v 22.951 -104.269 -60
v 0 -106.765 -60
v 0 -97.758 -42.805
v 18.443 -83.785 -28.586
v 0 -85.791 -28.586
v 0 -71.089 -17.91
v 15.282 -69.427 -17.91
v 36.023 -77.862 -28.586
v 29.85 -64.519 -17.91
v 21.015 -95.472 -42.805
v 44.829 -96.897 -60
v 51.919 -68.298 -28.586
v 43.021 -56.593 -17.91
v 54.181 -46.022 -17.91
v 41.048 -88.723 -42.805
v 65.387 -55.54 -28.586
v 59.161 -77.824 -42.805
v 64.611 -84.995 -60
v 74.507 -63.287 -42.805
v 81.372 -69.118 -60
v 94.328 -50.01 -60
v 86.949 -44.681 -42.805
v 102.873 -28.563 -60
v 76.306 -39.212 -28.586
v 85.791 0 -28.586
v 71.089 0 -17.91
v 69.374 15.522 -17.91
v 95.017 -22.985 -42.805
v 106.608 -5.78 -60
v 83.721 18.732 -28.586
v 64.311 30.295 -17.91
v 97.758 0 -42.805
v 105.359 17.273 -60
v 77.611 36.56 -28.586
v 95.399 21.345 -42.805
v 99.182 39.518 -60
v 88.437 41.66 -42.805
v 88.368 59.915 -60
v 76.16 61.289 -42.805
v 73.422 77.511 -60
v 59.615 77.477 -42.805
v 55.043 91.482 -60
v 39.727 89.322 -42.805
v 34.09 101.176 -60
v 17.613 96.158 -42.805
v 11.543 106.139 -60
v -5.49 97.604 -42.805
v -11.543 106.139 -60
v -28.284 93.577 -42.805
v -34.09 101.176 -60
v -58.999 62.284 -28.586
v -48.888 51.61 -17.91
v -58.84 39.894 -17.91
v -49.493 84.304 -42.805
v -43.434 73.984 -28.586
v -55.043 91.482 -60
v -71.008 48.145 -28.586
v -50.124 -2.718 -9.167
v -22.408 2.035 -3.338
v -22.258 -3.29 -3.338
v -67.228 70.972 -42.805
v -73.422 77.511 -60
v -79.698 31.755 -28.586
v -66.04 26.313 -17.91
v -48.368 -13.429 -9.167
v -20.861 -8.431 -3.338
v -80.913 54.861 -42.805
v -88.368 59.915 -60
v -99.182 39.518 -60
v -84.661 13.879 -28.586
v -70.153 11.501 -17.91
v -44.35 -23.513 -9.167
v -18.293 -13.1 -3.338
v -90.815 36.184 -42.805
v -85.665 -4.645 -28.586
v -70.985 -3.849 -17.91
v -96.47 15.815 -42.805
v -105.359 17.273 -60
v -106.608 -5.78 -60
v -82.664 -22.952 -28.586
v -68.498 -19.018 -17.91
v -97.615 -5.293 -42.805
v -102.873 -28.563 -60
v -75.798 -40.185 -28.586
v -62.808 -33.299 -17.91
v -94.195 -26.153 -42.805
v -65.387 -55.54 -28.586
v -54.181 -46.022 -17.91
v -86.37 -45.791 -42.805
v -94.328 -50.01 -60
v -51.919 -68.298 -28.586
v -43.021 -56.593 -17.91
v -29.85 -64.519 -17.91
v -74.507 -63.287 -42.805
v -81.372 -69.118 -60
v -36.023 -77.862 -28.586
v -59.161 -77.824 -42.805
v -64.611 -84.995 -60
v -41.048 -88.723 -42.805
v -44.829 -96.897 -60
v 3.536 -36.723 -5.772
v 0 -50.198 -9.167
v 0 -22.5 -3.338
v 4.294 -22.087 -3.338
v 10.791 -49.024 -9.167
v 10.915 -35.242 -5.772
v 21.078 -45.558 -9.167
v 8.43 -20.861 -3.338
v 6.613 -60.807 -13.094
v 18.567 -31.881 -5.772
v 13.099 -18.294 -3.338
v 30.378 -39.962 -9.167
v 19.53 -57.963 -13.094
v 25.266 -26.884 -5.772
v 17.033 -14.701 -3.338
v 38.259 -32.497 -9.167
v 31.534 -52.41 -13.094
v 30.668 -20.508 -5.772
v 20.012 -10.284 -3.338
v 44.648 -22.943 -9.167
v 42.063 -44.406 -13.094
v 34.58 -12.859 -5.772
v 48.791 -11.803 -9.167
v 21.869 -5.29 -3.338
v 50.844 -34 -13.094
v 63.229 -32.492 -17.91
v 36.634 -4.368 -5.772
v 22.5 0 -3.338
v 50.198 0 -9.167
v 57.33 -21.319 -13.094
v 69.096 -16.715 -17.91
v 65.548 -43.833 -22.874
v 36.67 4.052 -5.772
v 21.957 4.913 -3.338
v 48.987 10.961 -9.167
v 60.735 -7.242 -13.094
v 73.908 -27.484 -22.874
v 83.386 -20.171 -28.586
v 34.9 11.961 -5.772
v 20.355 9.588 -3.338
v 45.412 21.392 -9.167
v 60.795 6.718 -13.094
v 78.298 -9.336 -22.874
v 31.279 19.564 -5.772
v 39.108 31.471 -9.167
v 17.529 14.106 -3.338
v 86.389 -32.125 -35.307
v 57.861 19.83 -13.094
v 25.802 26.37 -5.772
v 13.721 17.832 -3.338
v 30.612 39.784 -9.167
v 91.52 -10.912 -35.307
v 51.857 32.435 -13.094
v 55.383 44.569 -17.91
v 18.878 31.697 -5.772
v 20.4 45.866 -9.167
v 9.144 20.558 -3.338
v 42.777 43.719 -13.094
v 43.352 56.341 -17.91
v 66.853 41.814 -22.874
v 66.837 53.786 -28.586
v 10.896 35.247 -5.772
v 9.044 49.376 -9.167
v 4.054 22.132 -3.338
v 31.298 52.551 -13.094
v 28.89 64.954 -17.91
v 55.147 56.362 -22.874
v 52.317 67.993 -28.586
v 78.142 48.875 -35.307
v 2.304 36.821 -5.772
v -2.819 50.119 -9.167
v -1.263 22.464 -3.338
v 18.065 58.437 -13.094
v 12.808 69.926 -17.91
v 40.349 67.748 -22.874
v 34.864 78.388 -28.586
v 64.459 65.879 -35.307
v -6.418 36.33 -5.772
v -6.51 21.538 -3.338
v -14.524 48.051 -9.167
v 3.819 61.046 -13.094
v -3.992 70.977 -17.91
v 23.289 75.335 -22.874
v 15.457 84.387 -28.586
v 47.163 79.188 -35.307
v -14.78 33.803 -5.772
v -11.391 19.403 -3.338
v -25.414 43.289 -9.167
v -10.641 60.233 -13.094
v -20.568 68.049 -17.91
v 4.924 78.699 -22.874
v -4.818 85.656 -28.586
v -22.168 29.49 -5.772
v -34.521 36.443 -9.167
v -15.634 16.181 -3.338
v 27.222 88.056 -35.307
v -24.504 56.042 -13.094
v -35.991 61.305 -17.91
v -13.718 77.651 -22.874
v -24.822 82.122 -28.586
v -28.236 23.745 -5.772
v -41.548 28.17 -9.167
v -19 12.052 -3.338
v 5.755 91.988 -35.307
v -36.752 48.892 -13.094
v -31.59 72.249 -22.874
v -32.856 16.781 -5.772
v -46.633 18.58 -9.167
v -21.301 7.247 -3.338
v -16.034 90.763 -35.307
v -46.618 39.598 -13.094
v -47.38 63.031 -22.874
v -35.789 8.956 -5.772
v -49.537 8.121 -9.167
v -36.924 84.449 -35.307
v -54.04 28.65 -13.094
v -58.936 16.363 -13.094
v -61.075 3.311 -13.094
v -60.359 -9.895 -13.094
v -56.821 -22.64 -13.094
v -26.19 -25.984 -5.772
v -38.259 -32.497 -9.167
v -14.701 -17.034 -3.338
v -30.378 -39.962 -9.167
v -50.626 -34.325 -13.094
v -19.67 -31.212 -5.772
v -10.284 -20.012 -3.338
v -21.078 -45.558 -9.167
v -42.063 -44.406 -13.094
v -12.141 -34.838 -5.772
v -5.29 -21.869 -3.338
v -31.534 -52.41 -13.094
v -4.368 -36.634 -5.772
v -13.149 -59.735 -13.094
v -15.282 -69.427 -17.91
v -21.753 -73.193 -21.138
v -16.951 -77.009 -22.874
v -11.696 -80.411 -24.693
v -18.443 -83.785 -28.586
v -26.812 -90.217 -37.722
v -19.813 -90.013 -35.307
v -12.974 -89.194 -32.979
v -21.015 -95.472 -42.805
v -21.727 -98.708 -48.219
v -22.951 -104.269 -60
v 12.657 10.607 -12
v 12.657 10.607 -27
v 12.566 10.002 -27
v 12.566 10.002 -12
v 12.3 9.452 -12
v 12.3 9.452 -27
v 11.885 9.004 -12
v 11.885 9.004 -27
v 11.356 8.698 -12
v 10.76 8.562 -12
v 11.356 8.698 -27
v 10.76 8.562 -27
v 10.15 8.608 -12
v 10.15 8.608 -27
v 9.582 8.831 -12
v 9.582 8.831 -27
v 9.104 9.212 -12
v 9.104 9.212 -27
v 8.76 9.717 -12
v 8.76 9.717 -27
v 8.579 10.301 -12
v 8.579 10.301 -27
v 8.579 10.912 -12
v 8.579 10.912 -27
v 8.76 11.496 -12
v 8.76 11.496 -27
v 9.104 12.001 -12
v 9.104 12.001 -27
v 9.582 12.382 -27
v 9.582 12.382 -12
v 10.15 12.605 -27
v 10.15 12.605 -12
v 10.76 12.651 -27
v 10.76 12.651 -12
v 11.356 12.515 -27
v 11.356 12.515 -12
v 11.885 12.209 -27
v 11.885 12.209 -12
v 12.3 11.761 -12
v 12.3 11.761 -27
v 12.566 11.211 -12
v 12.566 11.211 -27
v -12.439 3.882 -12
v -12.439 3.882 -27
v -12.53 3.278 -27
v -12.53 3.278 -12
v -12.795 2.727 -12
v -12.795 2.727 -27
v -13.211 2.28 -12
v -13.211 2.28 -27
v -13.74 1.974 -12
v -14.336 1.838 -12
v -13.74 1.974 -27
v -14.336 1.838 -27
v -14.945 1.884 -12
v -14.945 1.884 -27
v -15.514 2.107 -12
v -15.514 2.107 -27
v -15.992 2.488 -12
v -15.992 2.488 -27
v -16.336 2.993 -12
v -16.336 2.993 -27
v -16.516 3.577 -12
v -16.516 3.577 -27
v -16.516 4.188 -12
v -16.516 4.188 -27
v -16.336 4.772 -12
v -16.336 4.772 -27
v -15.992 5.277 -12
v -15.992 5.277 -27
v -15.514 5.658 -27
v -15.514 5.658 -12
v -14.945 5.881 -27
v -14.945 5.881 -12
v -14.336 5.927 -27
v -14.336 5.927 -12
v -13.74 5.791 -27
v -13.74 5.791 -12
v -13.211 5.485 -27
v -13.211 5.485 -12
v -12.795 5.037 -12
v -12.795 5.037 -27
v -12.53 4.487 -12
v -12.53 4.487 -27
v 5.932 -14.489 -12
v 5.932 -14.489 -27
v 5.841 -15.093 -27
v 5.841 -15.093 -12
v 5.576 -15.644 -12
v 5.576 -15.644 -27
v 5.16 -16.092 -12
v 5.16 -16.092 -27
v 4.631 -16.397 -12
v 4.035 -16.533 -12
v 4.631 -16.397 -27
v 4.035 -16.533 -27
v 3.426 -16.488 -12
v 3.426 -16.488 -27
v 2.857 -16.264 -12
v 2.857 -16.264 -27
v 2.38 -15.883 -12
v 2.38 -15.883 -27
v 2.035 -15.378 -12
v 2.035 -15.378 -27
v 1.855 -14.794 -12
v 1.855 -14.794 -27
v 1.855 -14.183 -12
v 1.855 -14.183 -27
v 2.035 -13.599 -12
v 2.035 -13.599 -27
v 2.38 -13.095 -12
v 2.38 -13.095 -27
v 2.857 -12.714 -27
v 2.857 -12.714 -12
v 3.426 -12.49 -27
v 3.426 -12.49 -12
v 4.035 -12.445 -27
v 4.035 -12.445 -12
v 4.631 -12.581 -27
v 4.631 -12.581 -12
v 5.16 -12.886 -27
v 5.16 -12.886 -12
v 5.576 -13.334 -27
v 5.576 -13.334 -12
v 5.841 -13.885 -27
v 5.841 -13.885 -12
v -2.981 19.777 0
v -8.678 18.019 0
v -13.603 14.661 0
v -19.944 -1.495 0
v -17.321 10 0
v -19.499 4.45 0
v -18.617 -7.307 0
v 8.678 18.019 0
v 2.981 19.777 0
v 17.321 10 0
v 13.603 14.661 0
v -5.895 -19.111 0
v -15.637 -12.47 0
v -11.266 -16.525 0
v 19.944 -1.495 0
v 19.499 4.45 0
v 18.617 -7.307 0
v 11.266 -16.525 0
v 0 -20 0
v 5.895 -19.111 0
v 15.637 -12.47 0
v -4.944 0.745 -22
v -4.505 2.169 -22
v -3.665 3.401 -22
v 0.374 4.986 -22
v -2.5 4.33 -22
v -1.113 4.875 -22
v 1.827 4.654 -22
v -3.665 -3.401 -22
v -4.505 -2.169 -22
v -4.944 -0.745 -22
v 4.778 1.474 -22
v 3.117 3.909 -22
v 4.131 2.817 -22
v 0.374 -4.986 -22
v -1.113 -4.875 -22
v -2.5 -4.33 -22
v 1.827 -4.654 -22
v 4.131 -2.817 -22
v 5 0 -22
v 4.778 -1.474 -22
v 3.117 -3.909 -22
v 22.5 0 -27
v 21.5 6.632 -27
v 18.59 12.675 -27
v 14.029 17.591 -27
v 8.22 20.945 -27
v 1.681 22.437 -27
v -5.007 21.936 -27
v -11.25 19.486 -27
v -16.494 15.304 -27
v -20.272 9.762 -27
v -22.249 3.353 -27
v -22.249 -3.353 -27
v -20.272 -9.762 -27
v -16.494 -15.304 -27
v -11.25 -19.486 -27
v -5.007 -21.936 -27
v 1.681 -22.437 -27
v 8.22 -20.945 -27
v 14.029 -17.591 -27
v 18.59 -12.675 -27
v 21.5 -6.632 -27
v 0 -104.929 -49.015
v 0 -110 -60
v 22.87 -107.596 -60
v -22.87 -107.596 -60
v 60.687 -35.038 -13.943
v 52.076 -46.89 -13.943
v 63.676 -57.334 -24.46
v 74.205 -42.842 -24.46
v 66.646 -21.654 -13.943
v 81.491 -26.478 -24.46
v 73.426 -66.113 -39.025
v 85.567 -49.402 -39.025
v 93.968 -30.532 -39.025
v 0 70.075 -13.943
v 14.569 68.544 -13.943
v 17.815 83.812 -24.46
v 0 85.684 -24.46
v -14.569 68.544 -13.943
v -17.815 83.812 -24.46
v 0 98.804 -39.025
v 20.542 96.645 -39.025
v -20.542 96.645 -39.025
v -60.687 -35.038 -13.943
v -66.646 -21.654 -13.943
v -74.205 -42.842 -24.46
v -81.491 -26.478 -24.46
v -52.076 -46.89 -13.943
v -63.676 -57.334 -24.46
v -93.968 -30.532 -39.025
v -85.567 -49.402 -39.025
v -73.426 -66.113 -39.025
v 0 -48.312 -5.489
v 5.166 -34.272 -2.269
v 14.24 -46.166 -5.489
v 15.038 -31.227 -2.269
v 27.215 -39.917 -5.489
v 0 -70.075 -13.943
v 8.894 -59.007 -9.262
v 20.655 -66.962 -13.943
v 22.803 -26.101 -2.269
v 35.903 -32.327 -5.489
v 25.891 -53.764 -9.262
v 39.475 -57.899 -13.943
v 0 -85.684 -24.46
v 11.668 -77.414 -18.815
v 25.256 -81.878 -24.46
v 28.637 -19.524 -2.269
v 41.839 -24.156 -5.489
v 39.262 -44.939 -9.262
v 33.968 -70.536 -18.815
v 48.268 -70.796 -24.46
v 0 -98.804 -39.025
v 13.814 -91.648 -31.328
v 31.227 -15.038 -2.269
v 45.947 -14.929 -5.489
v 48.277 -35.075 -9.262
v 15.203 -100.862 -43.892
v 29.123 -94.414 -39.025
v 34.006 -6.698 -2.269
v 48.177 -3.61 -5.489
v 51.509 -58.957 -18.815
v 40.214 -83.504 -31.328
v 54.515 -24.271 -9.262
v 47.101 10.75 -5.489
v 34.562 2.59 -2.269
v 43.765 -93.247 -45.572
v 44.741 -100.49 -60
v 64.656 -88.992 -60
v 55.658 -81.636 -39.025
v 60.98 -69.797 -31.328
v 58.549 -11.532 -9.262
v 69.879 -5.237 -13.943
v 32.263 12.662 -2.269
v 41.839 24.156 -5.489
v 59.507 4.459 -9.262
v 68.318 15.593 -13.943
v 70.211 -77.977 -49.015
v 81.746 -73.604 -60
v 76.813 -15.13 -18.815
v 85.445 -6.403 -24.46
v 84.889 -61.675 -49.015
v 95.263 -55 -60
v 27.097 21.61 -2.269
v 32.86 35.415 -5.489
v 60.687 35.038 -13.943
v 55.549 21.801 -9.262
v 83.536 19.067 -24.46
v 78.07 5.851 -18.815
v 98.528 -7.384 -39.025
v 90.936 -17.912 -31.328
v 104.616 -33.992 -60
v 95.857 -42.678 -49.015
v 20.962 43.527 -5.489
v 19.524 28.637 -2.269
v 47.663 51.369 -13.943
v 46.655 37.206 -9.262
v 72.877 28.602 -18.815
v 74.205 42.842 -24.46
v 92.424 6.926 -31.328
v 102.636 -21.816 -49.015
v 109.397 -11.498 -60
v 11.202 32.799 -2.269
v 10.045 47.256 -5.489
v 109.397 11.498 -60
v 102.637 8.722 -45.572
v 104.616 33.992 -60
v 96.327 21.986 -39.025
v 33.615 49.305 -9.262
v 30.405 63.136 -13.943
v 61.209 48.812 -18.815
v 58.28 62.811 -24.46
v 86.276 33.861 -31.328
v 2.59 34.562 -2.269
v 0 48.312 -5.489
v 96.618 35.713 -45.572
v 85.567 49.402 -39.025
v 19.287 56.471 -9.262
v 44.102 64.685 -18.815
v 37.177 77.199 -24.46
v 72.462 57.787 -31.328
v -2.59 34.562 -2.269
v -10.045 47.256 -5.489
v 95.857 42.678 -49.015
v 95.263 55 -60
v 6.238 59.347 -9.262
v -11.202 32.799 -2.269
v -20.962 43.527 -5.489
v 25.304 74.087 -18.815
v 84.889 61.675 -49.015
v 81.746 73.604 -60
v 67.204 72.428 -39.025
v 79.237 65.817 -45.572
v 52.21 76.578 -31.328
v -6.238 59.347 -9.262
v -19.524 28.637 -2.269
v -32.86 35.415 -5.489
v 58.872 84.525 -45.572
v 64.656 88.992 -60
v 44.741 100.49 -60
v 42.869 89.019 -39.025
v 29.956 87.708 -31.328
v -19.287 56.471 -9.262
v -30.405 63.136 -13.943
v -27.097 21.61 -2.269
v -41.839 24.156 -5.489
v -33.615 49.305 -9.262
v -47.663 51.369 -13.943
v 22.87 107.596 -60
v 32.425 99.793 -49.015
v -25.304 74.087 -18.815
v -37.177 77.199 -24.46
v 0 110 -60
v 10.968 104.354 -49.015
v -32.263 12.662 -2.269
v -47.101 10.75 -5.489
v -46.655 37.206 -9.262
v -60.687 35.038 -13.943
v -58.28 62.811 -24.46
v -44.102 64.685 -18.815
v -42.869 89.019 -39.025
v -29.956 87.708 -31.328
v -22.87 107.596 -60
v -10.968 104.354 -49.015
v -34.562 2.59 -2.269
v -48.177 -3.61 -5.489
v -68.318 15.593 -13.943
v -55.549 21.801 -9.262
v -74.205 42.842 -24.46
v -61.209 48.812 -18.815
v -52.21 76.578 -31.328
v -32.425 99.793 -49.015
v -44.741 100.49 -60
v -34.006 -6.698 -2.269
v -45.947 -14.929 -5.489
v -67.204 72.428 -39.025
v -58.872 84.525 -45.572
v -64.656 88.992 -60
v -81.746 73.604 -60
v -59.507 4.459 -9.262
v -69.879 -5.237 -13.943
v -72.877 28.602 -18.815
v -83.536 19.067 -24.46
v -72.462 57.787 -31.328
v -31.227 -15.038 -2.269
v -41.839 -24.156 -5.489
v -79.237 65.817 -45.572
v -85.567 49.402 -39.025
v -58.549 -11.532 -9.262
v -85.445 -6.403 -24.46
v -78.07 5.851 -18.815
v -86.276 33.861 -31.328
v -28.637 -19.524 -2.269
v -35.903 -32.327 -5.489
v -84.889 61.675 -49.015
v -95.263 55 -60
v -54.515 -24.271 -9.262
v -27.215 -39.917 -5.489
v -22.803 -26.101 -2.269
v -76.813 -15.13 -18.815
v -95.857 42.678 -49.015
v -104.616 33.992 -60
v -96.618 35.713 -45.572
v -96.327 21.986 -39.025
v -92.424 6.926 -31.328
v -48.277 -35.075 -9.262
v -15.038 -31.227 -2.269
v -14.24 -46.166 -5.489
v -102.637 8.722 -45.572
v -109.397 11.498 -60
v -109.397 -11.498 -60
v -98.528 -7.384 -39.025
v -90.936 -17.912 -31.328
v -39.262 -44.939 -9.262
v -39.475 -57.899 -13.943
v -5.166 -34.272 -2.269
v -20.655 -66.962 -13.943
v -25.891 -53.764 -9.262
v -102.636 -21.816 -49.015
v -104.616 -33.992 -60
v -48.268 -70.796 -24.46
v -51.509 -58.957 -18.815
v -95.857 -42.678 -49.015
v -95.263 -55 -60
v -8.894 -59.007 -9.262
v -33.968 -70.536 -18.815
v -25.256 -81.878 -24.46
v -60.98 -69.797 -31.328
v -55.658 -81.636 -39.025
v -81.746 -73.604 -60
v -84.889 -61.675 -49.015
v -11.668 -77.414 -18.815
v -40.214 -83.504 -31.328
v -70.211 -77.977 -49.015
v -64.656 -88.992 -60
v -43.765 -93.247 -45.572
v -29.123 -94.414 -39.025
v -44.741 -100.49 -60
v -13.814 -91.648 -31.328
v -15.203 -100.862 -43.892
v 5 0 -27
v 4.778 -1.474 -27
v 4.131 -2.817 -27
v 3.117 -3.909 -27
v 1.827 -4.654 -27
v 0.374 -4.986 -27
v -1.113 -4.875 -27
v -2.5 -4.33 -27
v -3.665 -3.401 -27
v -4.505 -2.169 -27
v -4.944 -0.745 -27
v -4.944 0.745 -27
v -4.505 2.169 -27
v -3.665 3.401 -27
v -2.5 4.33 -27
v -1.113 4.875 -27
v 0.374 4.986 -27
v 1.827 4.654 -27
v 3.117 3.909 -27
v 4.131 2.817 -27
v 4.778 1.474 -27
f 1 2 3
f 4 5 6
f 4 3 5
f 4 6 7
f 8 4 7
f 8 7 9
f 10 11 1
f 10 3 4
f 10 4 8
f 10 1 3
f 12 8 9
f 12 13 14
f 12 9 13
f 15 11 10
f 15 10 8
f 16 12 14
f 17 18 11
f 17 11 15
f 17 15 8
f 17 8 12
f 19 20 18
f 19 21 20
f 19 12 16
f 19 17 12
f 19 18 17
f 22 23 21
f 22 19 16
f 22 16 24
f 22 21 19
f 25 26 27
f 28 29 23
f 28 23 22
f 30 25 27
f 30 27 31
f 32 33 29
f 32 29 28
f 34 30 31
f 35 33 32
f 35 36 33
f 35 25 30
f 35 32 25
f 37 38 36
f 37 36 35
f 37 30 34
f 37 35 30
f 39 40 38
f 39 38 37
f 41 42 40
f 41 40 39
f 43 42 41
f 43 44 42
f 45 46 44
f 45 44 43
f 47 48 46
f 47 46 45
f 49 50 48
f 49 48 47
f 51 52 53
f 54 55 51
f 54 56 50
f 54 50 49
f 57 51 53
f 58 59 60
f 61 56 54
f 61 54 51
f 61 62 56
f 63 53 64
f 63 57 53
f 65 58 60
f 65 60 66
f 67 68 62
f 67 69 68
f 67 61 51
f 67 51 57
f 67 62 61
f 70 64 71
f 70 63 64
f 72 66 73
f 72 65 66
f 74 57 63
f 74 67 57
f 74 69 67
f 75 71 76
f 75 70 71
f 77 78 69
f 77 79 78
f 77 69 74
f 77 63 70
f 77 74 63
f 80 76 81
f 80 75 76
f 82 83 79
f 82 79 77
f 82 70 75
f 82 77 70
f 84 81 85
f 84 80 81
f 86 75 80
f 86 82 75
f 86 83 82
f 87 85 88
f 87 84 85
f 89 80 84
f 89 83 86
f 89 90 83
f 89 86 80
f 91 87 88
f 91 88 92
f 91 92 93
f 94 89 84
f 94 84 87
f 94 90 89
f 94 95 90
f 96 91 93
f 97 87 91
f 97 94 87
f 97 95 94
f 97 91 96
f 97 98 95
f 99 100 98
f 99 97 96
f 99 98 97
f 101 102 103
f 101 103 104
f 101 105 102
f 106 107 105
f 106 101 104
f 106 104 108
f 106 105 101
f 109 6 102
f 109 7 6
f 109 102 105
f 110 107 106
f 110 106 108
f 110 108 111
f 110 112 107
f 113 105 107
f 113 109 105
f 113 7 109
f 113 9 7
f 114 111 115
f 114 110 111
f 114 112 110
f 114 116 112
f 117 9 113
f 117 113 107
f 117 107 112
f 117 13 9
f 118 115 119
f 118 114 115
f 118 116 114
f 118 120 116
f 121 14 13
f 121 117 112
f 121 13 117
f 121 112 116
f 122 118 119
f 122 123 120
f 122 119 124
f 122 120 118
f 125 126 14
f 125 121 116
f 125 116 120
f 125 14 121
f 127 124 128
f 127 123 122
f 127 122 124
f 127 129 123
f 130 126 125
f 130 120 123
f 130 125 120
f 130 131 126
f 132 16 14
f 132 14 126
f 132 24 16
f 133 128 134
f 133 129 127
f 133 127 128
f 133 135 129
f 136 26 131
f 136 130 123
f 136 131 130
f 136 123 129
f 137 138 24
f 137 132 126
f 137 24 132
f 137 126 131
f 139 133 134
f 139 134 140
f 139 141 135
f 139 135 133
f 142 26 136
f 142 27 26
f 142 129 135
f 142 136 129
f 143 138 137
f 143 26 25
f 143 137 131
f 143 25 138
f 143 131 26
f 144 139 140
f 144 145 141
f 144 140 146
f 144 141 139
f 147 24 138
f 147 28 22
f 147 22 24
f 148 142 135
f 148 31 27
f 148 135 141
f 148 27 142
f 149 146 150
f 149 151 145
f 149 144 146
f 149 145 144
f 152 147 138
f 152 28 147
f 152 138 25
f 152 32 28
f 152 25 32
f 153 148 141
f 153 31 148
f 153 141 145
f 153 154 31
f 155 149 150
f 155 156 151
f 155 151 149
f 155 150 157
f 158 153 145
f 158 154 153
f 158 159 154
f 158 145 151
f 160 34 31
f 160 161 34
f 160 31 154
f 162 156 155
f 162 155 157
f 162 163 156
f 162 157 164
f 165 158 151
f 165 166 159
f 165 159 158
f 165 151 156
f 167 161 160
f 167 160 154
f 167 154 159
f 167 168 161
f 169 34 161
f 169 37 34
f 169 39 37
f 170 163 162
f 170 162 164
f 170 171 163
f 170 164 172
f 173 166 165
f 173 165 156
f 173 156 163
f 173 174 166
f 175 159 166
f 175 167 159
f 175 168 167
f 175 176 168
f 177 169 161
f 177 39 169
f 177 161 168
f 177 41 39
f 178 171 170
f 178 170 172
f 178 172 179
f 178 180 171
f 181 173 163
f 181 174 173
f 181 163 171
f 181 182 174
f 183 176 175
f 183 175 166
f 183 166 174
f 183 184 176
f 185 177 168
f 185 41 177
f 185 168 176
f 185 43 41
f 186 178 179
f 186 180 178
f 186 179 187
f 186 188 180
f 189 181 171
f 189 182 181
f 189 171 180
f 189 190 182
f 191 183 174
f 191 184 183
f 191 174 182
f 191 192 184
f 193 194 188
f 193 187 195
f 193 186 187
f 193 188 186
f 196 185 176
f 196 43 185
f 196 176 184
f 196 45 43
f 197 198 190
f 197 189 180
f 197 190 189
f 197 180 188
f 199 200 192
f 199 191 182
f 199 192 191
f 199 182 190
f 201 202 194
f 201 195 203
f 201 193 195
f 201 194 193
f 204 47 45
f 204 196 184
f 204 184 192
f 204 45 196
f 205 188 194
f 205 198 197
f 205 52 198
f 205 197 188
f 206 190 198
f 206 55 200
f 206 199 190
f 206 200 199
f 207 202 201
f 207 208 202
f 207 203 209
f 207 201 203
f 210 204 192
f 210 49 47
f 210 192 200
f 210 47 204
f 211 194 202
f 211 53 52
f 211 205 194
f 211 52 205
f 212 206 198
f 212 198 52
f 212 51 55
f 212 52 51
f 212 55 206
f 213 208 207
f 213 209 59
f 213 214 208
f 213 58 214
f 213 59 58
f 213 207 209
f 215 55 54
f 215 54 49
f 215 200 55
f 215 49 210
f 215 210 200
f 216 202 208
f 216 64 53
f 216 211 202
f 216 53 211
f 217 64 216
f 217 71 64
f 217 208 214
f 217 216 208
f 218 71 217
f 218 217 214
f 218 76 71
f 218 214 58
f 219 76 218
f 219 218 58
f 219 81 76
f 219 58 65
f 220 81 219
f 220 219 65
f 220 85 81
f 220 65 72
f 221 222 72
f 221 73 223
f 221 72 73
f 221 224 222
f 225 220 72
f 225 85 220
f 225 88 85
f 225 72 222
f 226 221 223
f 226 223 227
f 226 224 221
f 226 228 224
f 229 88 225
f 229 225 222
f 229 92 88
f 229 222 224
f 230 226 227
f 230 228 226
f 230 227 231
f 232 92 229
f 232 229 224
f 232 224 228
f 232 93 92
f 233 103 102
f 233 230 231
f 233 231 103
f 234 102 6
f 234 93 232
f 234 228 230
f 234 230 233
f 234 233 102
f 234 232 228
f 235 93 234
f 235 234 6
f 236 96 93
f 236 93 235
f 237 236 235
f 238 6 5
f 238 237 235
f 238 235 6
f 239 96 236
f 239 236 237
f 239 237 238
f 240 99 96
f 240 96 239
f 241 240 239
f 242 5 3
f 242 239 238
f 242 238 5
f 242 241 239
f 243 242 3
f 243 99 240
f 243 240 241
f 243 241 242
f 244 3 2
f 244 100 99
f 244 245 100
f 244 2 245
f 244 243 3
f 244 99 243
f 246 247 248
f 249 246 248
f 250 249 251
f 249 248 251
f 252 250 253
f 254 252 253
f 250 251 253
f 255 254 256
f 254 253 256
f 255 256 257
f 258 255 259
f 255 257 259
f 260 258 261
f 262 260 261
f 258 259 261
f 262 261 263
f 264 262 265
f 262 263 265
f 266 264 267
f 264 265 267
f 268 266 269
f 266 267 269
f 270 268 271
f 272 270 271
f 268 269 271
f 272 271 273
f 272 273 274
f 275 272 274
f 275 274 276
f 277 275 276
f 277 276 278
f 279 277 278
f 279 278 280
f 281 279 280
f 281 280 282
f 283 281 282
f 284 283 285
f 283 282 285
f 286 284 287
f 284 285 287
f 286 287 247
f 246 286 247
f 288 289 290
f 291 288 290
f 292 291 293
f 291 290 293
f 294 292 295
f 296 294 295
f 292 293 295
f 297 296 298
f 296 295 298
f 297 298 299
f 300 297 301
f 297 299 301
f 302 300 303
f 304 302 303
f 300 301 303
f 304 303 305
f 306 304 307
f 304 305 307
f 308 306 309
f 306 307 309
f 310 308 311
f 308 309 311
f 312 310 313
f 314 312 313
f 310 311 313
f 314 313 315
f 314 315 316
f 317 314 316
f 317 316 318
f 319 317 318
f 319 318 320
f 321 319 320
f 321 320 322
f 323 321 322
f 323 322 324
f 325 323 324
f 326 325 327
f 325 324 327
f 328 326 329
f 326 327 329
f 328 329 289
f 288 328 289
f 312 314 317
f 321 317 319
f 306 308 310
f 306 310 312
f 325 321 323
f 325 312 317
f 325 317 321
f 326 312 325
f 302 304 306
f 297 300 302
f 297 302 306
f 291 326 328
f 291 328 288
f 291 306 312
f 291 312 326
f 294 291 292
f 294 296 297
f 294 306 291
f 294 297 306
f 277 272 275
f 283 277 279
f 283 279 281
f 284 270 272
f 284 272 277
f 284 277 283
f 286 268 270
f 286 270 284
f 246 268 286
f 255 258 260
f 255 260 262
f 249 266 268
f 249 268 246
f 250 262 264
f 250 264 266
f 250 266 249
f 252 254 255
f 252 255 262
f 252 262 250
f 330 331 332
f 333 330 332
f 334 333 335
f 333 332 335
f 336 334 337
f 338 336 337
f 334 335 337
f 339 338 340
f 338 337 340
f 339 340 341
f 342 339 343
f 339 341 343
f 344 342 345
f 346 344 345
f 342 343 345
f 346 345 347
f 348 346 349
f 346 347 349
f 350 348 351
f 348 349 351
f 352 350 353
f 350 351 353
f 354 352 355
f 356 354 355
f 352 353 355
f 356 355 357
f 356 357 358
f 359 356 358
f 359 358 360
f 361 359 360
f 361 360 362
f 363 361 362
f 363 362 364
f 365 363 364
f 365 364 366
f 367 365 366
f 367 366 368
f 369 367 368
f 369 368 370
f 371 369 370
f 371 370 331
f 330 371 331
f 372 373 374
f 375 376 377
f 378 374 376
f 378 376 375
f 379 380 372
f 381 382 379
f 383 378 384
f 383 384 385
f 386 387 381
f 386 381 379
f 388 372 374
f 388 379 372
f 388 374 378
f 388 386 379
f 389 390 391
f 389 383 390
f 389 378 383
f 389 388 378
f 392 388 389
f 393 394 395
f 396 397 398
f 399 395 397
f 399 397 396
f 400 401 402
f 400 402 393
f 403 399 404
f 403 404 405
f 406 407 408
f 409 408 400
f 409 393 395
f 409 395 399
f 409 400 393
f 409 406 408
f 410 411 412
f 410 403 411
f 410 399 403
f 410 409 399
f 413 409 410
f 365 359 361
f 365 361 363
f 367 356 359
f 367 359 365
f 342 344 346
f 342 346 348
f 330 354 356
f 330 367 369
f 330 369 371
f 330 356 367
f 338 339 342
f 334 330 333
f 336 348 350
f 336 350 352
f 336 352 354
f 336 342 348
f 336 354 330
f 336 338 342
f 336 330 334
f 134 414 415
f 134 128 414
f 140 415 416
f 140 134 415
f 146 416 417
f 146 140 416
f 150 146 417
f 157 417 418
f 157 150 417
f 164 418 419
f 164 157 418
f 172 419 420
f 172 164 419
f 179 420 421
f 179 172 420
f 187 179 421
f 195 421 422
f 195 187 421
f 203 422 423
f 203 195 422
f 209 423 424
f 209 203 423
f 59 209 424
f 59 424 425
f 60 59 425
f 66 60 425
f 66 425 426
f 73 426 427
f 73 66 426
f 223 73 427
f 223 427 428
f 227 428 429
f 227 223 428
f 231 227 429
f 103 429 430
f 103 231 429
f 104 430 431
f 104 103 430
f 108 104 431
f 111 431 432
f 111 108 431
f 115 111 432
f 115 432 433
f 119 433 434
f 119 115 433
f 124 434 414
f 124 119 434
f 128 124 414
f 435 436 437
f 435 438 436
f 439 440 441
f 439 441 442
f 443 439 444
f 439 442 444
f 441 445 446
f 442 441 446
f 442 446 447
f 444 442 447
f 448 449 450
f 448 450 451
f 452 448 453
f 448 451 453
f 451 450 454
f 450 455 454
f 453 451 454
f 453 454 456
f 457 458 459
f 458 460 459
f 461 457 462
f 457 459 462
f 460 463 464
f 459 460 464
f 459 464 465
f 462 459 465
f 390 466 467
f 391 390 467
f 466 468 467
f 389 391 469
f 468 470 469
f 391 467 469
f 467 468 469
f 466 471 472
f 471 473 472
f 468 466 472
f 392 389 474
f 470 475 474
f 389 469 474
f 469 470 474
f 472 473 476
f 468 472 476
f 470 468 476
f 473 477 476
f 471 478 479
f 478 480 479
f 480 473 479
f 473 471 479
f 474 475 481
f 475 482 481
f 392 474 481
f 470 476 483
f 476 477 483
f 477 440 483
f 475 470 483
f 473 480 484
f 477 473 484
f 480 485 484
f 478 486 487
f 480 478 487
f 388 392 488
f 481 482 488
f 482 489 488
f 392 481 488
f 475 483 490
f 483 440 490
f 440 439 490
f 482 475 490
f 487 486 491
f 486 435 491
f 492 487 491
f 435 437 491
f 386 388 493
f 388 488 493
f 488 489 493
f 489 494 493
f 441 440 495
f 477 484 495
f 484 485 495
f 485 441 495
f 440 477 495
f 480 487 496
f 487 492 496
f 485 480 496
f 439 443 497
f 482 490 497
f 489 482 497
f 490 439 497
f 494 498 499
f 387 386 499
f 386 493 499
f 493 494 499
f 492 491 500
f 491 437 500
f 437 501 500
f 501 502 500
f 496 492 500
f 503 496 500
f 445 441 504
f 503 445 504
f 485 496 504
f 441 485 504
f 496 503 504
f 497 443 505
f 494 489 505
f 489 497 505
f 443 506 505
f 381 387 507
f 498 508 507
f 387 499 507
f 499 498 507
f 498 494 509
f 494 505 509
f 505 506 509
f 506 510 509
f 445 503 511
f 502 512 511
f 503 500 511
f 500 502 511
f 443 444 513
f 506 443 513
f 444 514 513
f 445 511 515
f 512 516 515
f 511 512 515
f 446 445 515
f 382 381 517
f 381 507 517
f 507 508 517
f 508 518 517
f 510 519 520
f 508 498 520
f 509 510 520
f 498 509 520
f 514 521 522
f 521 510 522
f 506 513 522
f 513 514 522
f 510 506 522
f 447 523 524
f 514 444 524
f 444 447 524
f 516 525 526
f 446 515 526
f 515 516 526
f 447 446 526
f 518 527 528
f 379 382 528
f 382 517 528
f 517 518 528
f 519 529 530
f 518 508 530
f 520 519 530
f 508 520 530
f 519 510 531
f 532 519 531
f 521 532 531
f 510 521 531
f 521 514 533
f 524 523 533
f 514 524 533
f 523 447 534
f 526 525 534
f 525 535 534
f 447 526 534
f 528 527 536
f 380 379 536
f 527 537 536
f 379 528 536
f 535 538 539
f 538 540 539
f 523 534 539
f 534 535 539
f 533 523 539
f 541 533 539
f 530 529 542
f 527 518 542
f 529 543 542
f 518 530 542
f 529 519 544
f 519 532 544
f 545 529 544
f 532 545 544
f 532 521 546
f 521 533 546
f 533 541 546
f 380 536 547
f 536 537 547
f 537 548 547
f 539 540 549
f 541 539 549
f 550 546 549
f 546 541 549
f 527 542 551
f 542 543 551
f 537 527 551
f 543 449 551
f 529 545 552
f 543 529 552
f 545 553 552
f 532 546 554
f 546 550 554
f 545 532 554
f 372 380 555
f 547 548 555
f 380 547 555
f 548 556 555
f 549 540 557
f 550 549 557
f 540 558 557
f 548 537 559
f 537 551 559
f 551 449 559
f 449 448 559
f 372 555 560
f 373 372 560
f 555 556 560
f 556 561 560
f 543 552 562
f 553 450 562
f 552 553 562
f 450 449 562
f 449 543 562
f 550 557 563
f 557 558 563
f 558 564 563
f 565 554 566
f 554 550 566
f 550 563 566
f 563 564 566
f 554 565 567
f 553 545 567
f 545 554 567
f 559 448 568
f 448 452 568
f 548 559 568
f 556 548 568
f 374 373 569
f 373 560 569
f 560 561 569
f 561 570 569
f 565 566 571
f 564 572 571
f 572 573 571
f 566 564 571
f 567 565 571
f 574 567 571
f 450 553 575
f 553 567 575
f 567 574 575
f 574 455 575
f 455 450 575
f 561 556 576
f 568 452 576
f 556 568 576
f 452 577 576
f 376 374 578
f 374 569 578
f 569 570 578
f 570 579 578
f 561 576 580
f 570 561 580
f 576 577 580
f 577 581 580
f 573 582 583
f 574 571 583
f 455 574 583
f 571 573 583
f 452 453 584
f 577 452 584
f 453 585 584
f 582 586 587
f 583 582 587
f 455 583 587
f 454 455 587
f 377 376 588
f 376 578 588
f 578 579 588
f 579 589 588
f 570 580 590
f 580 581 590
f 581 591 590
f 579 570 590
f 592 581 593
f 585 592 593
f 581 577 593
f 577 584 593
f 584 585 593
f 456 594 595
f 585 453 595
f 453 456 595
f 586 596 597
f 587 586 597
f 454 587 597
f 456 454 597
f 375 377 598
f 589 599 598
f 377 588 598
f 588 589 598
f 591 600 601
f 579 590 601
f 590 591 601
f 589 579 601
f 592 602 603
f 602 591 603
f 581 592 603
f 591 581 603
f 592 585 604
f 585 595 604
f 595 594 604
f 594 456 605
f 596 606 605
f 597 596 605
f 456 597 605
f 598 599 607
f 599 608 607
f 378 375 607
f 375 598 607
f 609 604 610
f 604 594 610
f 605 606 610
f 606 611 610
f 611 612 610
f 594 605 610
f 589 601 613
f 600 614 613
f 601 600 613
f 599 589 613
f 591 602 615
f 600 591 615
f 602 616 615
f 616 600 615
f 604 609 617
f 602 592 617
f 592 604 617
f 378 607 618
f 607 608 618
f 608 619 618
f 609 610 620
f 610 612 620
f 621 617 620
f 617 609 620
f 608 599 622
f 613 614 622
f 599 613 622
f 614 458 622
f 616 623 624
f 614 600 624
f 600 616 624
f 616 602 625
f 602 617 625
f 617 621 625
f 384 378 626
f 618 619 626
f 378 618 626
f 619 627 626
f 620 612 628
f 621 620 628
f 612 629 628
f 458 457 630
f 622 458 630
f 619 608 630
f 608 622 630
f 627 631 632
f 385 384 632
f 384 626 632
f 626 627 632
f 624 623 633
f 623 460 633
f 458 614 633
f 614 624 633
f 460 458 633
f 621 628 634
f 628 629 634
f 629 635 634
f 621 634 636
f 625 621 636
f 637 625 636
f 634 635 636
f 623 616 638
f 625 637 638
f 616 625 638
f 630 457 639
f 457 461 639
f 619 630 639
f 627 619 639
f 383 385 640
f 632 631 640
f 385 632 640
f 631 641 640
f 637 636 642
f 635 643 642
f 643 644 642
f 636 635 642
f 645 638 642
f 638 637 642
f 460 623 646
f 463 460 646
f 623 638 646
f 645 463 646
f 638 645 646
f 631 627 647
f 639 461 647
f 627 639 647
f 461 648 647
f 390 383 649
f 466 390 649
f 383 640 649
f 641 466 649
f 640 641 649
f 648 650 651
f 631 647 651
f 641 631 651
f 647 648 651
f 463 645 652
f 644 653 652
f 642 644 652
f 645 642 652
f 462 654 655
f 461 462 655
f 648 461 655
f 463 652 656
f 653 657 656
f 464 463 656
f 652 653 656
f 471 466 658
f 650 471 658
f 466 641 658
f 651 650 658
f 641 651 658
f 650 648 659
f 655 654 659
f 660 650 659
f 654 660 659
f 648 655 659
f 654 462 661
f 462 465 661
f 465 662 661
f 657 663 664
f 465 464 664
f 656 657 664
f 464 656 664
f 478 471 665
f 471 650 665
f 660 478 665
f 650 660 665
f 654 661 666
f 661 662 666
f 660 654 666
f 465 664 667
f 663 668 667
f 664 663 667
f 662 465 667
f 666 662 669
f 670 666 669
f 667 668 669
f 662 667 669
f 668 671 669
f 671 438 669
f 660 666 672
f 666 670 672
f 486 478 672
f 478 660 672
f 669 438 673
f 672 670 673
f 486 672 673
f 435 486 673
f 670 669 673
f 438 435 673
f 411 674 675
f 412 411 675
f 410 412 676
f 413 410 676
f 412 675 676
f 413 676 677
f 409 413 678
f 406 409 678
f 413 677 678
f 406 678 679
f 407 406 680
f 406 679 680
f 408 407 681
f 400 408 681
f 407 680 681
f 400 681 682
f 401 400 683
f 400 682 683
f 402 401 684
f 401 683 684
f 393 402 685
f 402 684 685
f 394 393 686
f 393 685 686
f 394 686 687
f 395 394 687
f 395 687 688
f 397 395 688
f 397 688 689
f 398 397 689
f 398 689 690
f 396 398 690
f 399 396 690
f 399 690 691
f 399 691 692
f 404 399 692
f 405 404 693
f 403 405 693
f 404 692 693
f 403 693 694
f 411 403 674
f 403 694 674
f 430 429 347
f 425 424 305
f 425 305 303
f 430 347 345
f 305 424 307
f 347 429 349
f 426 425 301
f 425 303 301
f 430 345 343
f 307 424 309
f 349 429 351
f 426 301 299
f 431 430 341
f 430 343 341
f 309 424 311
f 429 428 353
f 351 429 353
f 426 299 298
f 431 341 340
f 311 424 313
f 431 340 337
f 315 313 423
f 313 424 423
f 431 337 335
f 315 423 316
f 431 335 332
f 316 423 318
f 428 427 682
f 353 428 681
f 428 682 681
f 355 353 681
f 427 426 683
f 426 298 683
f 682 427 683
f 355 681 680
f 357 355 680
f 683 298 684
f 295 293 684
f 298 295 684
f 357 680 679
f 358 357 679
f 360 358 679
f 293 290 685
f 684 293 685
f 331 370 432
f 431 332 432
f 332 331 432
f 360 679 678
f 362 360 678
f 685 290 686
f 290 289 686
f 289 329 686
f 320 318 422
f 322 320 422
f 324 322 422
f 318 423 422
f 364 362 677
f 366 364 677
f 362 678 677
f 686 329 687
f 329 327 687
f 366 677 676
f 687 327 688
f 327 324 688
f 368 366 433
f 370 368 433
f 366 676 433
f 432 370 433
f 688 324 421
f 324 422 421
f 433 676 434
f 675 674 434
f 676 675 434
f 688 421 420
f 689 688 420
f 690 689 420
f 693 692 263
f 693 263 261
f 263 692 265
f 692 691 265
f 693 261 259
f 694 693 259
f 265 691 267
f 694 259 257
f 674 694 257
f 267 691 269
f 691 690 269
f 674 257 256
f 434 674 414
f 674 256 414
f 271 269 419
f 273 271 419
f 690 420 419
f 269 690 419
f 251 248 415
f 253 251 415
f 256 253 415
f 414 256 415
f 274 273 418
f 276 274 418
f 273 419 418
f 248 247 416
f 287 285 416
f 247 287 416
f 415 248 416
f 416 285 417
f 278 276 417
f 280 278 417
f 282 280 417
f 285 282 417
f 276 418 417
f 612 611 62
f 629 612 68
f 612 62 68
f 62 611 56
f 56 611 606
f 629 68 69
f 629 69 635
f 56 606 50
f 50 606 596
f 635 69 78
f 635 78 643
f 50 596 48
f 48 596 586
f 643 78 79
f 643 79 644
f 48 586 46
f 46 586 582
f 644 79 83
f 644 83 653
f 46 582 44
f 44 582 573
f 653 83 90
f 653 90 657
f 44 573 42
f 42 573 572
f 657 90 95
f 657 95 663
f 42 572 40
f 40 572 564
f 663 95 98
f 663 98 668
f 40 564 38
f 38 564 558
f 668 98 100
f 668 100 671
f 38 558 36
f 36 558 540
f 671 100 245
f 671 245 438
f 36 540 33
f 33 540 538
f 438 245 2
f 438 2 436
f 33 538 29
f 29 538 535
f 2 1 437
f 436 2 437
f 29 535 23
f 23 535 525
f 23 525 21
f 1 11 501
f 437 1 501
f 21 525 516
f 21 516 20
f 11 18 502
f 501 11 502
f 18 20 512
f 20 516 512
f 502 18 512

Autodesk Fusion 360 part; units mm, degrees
sketch "Sketch1" plane through (0, 0, 0) normal (1, 0, 0) x (0, 1, 0)
  spline S0 degree 5 poles (-20, 0) (-22.7257, -0.3253) (-28.0984, -1.0502) (-35.9212, -2.3607) (-45.8716, -4.5618) (-57.453, -8.1224) (-68.0948, -12.571) (-77.709, -17.9907) (-86.2289, -24.4443) (-93.6692, -31.9182) (-100.0996, -40.3463) (-104.4963, -47.7952) (-107.3992, -53.7549) (-109.1618, -57.8911) (-110, -60) knots 0 0 0 0 0 0 0.1 0.2 0.3 0.4 0.5 0.6 0.7 0.8 0.9 1 1 1 1 1 1
  spline S1 degree 3 poles (-19.6445, -2.9789) (-34.008, -4.693) (-47.0407, -7.6194) (-58.39, -11.9827) (-67.6436, -15.5402) (-75.7205, -20.0828) (-82.5658, -25.7517) (-91.5958, -33.2299) (-98.5876, -42.6658) (-103.9793, -53.7643) (-105.1319, -56.1368) (-106.2094, -58.5851) (-107.2121, -61.108) knots 0 0 0 0 0.320426 0.320426 0.320426 0.581685 0.581685 0.581685 0.926327 0.926327 0.926327 1 1 1 1
  line L0 (0, 0) -> (0, -2.9702)
  line L1 (-110, -60) -> (-106.765, -60)
  line L2 (-20, 0) -> (0, 0)
  line L3 (-19.6445, -2.9789) -> (0, -2.9702)
  point P0 (-80, -20)
  dimension "d1" = 110
  dimension "d2" = 60
  dimension "d3" = 80
  dimension "d4" = 20
  dimension "d5" = -3
  dimension "d18" = 20
revolve "Revolve1" add sketch "Sketch1" angle 360 about axis through (0, 0, 1.75) along (0, 0, 1)
ref_plane "WorkPlane1" through (0, 0, -2) normal (0, 0, 1) x (1, 0, 0)
sketch "Sketch2" plane through (0, 0, -2) normal (0, 0, 1) x (1, 0, 0)
  circle A0 centre (0, 0) radius 22.5
  dimension "d7" = 45
extrude "Extrude1" add sketch "Sketch2" against normal blind 25
sketch "Sketch3" plane through (0, 0, -27) normal (0, 0, -1) x (1, 0, 0)
  circle A0 centre (0, 0) radius 22.5
  circle A1 centre (10.6066, -10.6066) radius 2.05
  circle A2 centre (3.8823, 14.4889) radius 2.05
  circle A3 centre (-14.4889, -3.8823) radius 2.05
  line L0 (0, 0) -> (10.6066, -10.6066) construction
  dimension "d10" = 4.1
  dimension "d14" = 360
  dimension "d19" = 15
extrude "Extrude2" cut sketch "Sketch3" against normal blind 15 contours A1 | A2 | A3
sketch "Sketch4" plane through (0, 0, -27) normal (0, 0, -1) x (1, 0, 0)
  circle A0 centre (10.6066, -10.6066) radius 2.05
  circle A1 centre (-14.4889, -3.8823) radius 2.05
  circle A2 centre (3.8823, 14.4889) radius 2.05
  circle A3 centre (0, 0) radius 22.5
  circle A4 centre (0, 0) radius 5
  dimension "d20" = 10
extrude "Extrude3" cut sketch "Sketch4" against normal blind 5 contours A4
